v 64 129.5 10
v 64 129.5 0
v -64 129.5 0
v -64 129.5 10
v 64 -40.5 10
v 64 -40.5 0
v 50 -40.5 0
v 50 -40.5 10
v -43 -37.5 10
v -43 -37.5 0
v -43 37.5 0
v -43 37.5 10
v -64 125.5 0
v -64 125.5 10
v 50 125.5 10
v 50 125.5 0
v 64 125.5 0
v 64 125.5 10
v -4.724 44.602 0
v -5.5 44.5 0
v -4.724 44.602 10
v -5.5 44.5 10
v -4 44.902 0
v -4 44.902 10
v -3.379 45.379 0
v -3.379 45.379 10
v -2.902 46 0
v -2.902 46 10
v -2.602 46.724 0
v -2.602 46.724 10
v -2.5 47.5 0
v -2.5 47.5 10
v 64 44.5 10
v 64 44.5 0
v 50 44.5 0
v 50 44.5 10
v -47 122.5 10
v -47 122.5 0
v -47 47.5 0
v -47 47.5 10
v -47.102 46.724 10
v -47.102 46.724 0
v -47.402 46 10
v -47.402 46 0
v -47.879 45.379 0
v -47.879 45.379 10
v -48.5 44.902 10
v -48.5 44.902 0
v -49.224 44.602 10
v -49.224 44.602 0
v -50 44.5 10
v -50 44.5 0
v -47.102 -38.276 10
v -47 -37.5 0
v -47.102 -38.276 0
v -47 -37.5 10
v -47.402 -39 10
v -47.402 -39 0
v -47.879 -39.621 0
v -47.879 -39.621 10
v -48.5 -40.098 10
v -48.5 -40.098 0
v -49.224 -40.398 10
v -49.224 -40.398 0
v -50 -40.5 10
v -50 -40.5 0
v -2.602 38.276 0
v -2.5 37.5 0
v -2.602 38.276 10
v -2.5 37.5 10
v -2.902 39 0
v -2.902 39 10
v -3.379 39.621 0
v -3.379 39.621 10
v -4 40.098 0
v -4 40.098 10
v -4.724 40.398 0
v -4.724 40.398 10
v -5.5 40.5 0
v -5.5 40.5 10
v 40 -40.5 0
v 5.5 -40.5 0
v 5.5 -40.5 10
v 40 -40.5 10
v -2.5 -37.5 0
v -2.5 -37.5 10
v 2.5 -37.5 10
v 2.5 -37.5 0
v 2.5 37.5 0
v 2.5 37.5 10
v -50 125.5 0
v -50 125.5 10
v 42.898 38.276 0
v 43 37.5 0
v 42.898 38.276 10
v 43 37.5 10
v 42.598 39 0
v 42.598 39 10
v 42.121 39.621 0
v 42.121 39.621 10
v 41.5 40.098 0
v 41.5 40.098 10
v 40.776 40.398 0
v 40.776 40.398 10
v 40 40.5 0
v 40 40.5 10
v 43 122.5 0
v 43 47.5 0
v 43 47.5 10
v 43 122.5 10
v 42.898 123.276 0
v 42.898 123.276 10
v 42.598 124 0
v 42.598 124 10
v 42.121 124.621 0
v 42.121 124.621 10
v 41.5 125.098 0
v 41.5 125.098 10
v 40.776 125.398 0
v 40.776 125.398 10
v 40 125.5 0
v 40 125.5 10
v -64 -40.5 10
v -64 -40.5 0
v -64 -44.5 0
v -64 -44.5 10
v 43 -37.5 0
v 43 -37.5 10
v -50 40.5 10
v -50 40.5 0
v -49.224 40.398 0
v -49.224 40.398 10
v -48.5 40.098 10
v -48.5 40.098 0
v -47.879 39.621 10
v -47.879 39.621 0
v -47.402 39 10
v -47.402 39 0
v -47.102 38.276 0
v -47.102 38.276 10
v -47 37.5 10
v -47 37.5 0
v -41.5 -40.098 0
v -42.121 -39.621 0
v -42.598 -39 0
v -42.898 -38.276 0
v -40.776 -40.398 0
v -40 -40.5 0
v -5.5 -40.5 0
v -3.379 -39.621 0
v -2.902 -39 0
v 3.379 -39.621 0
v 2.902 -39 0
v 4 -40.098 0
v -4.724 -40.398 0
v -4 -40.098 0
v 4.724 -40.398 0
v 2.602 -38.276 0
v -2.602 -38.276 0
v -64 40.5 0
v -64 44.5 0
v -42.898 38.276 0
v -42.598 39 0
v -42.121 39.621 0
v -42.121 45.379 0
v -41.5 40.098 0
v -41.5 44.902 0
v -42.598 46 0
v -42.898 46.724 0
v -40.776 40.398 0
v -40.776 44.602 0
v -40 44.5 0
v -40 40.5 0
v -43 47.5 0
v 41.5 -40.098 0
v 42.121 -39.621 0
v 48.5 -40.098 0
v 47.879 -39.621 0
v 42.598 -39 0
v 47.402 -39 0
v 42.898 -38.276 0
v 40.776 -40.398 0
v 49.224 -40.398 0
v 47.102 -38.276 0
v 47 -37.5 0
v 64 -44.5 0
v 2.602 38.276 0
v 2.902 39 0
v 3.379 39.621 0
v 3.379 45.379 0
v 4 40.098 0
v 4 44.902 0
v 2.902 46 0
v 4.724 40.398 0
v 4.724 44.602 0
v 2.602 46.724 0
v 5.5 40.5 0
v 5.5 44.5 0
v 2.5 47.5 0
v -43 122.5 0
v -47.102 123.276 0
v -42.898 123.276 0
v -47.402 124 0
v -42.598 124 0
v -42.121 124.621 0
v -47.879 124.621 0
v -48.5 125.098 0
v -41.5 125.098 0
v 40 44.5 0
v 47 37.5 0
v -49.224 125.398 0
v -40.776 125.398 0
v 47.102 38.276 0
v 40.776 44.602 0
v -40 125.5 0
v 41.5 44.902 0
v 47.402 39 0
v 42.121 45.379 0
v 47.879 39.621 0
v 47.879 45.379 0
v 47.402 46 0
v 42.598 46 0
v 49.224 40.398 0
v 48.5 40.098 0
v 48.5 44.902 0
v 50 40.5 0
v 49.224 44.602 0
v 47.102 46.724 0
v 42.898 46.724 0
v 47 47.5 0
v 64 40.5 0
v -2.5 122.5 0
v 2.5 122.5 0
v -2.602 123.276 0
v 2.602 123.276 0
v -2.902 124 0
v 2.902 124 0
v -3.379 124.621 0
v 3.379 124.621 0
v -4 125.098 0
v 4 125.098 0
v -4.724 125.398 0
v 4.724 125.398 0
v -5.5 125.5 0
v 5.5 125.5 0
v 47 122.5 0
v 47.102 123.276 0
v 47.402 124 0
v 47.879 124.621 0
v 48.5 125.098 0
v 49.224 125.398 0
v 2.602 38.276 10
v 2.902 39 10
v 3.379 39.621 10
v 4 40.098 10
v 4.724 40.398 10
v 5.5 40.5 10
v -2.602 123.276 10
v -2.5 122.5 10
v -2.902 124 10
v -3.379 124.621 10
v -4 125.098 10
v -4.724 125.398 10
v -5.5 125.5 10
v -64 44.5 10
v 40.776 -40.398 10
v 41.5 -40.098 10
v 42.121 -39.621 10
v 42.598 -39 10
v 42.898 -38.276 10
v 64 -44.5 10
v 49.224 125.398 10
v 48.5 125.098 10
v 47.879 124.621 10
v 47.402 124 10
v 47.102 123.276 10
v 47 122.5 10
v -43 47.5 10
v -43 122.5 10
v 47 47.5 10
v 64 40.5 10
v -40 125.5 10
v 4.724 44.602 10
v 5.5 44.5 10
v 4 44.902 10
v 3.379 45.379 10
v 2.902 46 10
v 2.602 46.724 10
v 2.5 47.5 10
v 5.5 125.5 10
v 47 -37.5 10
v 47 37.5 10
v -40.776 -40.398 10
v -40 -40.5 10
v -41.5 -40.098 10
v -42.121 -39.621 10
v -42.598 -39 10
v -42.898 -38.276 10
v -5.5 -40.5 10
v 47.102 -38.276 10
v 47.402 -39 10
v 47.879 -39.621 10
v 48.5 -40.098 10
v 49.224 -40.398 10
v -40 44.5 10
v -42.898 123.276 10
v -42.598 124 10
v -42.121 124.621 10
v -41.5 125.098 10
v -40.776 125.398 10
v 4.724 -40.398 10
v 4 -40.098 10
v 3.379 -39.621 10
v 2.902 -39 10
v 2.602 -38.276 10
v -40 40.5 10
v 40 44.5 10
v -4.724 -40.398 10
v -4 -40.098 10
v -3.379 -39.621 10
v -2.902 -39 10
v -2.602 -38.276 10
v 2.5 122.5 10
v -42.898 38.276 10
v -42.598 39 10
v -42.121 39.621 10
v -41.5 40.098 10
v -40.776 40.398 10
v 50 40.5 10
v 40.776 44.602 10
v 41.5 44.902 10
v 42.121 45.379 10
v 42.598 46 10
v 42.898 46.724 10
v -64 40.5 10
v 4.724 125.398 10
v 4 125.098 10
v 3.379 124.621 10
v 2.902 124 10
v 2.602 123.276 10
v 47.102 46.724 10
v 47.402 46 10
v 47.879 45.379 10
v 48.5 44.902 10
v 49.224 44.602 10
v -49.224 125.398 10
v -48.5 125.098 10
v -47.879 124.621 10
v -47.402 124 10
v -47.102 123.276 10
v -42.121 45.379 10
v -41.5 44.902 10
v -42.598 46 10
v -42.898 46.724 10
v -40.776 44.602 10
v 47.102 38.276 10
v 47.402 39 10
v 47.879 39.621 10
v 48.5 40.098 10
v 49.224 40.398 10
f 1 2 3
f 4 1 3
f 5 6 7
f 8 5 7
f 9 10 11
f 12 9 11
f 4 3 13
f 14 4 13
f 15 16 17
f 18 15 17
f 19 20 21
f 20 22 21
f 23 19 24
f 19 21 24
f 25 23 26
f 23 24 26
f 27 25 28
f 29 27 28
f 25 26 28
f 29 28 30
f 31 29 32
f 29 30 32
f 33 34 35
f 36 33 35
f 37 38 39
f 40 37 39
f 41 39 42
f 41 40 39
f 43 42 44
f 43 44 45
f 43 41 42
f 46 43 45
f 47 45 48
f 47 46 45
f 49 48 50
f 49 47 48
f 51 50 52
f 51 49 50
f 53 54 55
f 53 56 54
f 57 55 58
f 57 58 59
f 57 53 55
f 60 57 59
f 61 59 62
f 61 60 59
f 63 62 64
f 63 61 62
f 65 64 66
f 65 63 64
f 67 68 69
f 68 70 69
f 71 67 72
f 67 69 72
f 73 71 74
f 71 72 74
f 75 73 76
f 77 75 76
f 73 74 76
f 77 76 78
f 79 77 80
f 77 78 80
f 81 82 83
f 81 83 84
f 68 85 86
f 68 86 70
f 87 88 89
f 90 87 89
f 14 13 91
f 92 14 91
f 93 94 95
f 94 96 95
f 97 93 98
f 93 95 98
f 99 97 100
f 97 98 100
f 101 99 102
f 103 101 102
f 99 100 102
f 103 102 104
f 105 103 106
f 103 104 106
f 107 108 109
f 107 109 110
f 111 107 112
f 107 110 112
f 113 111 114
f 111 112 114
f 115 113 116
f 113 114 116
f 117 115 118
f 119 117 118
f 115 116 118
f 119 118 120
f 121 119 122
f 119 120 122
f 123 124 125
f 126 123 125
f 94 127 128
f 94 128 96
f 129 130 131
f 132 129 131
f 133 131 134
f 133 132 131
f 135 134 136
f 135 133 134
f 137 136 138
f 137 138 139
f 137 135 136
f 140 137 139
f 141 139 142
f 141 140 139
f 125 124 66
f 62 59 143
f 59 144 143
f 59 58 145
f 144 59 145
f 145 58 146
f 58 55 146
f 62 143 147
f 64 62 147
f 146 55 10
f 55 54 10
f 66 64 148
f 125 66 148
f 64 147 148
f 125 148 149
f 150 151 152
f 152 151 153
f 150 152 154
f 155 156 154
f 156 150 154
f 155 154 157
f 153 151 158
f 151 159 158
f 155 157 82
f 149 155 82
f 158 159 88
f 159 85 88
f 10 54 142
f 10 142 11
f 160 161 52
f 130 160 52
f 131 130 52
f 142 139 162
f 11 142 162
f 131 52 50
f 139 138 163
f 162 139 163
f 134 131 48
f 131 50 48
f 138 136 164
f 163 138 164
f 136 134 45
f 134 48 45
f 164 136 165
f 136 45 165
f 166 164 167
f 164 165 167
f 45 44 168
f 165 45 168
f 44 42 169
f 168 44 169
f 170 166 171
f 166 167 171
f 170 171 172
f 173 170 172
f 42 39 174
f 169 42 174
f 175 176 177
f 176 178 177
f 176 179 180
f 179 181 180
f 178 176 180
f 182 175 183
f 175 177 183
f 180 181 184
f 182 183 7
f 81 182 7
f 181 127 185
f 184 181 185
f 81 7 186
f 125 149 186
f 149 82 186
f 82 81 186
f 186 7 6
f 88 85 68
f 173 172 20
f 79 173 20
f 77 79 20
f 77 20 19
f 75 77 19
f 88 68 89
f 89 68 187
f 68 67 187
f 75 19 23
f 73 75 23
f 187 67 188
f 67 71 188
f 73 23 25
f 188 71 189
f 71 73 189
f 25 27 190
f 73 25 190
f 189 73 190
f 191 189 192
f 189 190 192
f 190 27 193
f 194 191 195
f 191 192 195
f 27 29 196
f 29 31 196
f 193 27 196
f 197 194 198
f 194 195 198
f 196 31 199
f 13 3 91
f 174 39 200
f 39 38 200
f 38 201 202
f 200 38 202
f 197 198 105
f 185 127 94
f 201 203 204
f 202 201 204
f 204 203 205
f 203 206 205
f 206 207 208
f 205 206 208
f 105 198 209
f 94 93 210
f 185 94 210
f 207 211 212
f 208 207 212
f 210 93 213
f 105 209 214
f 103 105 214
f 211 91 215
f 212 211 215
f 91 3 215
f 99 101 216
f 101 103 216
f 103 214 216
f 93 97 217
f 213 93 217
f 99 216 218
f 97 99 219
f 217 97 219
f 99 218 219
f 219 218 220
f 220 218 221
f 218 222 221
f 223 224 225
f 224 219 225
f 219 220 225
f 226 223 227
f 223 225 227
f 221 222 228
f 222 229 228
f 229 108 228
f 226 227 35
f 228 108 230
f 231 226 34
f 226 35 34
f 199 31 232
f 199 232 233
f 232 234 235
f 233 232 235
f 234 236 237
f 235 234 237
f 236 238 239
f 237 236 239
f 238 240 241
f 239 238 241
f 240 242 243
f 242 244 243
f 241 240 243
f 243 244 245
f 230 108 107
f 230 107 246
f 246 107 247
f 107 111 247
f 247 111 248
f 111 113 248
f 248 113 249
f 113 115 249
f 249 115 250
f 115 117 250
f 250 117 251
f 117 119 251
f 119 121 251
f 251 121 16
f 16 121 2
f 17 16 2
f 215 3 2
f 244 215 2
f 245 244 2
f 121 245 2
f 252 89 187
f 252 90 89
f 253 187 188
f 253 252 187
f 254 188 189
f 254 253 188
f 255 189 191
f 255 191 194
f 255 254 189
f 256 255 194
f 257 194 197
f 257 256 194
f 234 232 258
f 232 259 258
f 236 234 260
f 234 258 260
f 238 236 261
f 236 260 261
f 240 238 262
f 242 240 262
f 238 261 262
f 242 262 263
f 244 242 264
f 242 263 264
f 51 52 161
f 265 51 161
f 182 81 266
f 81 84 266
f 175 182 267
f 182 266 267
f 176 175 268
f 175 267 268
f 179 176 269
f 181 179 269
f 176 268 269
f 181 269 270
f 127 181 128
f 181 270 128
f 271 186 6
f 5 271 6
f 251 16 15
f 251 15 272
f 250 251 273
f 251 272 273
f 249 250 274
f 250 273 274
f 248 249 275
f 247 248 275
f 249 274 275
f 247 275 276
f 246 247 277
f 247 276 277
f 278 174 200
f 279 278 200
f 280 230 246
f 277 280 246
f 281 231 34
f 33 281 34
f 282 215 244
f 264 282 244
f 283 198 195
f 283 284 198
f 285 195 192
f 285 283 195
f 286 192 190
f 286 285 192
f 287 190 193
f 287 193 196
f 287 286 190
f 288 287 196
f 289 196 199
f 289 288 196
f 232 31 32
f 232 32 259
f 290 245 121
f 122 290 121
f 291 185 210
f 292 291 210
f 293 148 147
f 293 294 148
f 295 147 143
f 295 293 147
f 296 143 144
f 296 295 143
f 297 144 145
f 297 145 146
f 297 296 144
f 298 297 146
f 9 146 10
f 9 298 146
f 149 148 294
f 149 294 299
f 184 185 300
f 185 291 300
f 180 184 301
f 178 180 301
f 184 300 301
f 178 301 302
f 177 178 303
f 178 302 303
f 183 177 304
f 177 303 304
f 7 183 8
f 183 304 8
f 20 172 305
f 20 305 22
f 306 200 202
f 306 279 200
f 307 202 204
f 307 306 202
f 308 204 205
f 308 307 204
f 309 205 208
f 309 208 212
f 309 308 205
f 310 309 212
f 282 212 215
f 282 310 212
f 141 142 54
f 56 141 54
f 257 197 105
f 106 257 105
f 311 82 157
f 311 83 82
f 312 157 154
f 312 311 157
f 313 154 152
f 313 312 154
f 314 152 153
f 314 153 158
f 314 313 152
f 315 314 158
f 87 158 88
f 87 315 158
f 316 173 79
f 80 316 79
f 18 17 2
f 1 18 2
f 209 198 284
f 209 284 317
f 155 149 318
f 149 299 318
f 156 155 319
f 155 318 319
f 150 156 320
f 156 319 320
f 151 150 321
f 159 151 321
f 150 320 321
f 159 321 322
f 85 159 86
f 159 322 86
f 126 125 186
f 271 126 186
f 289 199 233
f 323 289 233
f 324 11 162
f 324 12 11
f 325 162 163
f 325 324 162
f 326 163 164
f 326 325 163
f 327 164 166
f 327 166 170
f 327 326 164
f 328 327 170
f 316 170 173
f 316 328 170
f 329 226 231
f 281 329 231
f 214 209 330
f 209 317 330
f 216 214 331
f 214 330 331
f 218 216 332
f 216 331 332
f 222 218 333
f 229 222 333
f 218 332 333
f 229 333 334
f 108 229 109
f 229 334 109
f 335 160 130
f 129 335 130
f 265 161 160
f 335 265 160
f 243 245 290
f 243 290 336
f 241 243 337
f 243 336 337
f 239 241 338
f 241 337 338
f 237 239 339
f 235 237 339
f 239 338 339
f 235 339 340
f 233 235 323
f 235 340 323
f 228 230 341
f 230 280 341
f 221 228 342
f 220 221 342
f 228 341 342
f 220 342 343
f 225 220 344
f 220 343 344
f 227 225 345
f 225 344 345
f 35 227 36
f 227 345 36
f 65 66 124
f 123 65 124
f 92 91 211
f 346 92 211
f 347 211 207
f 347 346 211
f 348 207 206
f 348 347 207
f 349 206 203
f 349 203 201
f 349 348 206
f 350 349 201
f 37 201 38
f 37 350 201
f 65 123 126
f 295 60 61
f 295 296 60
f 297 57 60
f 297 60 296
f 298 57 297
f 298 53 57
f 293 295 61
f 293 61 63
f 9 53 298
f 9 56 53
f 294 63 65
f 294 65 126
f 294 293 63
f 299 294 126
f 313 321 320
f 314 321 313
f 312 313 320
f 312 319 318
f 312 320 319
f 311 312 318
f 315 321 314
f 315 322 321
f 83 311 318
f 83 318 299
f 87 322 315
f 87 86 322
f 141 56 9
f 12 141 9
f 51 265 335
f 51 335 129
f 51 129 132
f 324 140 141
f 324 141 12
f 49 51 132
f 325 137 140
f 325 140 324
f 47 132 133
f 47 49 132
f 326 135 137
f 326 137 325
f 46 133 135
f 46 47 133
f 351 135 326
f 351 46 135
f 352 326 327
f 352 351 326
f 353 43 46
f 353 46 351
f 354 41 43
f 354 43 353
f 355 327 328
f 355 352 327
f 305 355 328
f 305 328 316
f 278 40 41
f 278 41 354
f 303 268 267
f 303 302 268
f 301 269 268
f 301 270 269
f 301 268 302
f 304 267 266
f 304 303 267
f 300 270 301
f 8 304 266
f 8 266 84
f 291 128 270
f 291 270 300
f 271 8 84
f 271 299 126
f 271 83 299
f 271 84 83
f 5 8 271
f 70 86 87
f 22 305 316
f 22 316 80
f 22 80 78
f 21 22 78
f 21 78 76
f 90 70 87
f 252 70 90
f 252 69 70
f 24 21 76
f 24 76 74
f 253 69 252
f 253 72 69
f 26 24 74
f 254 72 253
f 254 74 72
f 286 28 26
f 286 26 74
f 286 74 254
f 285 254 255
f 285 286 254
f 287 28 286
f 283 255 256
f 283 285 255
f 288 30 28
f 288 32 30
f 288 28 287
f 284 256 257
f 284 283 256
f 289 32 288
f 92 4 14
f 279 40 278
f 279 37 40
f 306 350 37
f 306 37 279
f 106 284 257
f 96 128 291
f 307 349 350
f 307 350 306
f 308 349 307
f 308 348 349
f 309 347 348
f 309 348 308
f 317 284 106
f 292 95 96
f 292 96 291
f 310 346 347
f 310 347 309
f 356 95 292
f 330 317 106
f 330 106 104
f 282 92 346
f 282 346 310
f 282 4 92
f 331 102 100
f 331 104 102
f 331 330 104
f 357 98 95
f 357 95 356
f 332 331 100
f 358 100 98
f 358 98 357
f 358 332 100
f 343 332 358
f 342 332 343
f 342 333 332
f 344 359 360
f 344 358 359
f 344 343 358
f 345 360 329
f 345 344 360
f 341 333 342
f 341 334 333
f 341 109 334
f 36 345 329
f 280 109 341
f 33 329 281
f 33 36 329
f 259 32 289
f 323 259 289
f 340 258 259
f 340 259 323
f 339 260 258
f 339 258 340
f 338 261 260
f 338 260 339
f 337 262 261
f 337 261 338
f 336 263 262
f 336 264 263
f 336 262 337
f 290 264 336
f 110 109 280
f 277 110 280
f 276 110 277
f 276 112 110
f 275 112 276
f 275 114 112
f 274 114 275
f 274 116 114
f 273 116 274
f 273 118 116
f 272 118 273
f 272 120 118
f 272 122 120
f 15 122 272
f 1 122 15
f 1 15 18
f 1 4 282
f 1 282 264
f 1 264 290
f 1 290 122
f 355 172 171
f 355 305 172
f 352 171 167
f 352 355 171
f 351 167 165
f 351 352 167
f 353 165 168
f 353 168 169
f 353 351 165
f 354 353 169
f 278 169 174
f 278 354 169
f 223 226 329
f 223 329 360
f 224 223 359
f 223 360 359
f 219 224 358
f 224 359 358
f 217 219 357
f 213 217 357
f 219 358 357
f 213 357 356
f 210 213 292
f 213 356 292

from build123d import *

# Parameters (mm, degrees)
SKETCH1_W           = 40.5
SKETCH1_H           = 81
BOSS_EXTRUDE1_DEPTH = 10
FILLET1_R           = 3


with BuildPart() as part:
    # Sketch1 → Boss-Extrude1 (new body)
    with BuildSketch(Plane.XY):
        Polygon((-64, 129.5), (-64, 125.5), (-47, 125.5), (-47, 44.5), (-64, 44.5), (-64, 40.5), (-47, 40.5), (-47, -40.5), (-64, -40.5), (-64, -44.5), (0, -44.5), (64, -44.5), (64, -40.5), (47, -40.5), (47, 40.5), (64, 40.5), (64, 44.5), (47, 44.5), (47, 125.5), (64, 125.5), (64, 129.5), (0, 129.5), align=None)
        with Locations((-22.75, 0)):
            Rectangle(SKETCH1_W, SKETCH1_H, mode=Mode.SUBTRACT)
        with Locations((22.75, 0)):
            Rectangle(SKETCH1_W, SKETCH1_H, mode=Mode.SUBTRACT)
        with Locations((-22.75, 85)):
            Rectangle(SKETCH1_W, SKETCH1_H, mode=Mode.SUBTRACT)
        with Locations((22.75, 85)):
            Rectangle(SKETCH1_W, SKETCH1_H, mode=Mode.SUBTRACT)
    extrude(amount=BOSS_EXTRUDE1_DEPTH)

    # Fillet1
    fillet1_edges = [part.edges().sort_by_distance(p)[0] for p in [
        (43, -40.5, 5),
        (43, 40.5, 5),
        (2.5, 40.5, 5),
        (2.5, -40.5, 5),
        (43, 44.5, 5),
        (43, 125.5, 5),
        (2.5, 125.5, 5),
        (2.5, 44.5, 5),
        (-43, 40.5, 5),
        (-43, -40.5, 5),
        (-2.5, -40.5, 5),
        (-2.5, 40.5, 5),
        (-43, 125.5, 5),
        (-43, 44.5, 5),
        (-2.5, 44.5, 5),
        (-2.5, 125.5, 5),
        (-47, 44.5, 5),
        (-47, 125.5, 5),
        (47, 125.5, 5),
        (47, 44.5, 5),
        (47, 40.5, 5),
        (47, -40.5, 5),
        (-47, -40.5, 5),
        (-47, 40.5, 5),
    ]]
    fillet(fillet1_edges, radius=FILLET1_R)


solid = part.part
